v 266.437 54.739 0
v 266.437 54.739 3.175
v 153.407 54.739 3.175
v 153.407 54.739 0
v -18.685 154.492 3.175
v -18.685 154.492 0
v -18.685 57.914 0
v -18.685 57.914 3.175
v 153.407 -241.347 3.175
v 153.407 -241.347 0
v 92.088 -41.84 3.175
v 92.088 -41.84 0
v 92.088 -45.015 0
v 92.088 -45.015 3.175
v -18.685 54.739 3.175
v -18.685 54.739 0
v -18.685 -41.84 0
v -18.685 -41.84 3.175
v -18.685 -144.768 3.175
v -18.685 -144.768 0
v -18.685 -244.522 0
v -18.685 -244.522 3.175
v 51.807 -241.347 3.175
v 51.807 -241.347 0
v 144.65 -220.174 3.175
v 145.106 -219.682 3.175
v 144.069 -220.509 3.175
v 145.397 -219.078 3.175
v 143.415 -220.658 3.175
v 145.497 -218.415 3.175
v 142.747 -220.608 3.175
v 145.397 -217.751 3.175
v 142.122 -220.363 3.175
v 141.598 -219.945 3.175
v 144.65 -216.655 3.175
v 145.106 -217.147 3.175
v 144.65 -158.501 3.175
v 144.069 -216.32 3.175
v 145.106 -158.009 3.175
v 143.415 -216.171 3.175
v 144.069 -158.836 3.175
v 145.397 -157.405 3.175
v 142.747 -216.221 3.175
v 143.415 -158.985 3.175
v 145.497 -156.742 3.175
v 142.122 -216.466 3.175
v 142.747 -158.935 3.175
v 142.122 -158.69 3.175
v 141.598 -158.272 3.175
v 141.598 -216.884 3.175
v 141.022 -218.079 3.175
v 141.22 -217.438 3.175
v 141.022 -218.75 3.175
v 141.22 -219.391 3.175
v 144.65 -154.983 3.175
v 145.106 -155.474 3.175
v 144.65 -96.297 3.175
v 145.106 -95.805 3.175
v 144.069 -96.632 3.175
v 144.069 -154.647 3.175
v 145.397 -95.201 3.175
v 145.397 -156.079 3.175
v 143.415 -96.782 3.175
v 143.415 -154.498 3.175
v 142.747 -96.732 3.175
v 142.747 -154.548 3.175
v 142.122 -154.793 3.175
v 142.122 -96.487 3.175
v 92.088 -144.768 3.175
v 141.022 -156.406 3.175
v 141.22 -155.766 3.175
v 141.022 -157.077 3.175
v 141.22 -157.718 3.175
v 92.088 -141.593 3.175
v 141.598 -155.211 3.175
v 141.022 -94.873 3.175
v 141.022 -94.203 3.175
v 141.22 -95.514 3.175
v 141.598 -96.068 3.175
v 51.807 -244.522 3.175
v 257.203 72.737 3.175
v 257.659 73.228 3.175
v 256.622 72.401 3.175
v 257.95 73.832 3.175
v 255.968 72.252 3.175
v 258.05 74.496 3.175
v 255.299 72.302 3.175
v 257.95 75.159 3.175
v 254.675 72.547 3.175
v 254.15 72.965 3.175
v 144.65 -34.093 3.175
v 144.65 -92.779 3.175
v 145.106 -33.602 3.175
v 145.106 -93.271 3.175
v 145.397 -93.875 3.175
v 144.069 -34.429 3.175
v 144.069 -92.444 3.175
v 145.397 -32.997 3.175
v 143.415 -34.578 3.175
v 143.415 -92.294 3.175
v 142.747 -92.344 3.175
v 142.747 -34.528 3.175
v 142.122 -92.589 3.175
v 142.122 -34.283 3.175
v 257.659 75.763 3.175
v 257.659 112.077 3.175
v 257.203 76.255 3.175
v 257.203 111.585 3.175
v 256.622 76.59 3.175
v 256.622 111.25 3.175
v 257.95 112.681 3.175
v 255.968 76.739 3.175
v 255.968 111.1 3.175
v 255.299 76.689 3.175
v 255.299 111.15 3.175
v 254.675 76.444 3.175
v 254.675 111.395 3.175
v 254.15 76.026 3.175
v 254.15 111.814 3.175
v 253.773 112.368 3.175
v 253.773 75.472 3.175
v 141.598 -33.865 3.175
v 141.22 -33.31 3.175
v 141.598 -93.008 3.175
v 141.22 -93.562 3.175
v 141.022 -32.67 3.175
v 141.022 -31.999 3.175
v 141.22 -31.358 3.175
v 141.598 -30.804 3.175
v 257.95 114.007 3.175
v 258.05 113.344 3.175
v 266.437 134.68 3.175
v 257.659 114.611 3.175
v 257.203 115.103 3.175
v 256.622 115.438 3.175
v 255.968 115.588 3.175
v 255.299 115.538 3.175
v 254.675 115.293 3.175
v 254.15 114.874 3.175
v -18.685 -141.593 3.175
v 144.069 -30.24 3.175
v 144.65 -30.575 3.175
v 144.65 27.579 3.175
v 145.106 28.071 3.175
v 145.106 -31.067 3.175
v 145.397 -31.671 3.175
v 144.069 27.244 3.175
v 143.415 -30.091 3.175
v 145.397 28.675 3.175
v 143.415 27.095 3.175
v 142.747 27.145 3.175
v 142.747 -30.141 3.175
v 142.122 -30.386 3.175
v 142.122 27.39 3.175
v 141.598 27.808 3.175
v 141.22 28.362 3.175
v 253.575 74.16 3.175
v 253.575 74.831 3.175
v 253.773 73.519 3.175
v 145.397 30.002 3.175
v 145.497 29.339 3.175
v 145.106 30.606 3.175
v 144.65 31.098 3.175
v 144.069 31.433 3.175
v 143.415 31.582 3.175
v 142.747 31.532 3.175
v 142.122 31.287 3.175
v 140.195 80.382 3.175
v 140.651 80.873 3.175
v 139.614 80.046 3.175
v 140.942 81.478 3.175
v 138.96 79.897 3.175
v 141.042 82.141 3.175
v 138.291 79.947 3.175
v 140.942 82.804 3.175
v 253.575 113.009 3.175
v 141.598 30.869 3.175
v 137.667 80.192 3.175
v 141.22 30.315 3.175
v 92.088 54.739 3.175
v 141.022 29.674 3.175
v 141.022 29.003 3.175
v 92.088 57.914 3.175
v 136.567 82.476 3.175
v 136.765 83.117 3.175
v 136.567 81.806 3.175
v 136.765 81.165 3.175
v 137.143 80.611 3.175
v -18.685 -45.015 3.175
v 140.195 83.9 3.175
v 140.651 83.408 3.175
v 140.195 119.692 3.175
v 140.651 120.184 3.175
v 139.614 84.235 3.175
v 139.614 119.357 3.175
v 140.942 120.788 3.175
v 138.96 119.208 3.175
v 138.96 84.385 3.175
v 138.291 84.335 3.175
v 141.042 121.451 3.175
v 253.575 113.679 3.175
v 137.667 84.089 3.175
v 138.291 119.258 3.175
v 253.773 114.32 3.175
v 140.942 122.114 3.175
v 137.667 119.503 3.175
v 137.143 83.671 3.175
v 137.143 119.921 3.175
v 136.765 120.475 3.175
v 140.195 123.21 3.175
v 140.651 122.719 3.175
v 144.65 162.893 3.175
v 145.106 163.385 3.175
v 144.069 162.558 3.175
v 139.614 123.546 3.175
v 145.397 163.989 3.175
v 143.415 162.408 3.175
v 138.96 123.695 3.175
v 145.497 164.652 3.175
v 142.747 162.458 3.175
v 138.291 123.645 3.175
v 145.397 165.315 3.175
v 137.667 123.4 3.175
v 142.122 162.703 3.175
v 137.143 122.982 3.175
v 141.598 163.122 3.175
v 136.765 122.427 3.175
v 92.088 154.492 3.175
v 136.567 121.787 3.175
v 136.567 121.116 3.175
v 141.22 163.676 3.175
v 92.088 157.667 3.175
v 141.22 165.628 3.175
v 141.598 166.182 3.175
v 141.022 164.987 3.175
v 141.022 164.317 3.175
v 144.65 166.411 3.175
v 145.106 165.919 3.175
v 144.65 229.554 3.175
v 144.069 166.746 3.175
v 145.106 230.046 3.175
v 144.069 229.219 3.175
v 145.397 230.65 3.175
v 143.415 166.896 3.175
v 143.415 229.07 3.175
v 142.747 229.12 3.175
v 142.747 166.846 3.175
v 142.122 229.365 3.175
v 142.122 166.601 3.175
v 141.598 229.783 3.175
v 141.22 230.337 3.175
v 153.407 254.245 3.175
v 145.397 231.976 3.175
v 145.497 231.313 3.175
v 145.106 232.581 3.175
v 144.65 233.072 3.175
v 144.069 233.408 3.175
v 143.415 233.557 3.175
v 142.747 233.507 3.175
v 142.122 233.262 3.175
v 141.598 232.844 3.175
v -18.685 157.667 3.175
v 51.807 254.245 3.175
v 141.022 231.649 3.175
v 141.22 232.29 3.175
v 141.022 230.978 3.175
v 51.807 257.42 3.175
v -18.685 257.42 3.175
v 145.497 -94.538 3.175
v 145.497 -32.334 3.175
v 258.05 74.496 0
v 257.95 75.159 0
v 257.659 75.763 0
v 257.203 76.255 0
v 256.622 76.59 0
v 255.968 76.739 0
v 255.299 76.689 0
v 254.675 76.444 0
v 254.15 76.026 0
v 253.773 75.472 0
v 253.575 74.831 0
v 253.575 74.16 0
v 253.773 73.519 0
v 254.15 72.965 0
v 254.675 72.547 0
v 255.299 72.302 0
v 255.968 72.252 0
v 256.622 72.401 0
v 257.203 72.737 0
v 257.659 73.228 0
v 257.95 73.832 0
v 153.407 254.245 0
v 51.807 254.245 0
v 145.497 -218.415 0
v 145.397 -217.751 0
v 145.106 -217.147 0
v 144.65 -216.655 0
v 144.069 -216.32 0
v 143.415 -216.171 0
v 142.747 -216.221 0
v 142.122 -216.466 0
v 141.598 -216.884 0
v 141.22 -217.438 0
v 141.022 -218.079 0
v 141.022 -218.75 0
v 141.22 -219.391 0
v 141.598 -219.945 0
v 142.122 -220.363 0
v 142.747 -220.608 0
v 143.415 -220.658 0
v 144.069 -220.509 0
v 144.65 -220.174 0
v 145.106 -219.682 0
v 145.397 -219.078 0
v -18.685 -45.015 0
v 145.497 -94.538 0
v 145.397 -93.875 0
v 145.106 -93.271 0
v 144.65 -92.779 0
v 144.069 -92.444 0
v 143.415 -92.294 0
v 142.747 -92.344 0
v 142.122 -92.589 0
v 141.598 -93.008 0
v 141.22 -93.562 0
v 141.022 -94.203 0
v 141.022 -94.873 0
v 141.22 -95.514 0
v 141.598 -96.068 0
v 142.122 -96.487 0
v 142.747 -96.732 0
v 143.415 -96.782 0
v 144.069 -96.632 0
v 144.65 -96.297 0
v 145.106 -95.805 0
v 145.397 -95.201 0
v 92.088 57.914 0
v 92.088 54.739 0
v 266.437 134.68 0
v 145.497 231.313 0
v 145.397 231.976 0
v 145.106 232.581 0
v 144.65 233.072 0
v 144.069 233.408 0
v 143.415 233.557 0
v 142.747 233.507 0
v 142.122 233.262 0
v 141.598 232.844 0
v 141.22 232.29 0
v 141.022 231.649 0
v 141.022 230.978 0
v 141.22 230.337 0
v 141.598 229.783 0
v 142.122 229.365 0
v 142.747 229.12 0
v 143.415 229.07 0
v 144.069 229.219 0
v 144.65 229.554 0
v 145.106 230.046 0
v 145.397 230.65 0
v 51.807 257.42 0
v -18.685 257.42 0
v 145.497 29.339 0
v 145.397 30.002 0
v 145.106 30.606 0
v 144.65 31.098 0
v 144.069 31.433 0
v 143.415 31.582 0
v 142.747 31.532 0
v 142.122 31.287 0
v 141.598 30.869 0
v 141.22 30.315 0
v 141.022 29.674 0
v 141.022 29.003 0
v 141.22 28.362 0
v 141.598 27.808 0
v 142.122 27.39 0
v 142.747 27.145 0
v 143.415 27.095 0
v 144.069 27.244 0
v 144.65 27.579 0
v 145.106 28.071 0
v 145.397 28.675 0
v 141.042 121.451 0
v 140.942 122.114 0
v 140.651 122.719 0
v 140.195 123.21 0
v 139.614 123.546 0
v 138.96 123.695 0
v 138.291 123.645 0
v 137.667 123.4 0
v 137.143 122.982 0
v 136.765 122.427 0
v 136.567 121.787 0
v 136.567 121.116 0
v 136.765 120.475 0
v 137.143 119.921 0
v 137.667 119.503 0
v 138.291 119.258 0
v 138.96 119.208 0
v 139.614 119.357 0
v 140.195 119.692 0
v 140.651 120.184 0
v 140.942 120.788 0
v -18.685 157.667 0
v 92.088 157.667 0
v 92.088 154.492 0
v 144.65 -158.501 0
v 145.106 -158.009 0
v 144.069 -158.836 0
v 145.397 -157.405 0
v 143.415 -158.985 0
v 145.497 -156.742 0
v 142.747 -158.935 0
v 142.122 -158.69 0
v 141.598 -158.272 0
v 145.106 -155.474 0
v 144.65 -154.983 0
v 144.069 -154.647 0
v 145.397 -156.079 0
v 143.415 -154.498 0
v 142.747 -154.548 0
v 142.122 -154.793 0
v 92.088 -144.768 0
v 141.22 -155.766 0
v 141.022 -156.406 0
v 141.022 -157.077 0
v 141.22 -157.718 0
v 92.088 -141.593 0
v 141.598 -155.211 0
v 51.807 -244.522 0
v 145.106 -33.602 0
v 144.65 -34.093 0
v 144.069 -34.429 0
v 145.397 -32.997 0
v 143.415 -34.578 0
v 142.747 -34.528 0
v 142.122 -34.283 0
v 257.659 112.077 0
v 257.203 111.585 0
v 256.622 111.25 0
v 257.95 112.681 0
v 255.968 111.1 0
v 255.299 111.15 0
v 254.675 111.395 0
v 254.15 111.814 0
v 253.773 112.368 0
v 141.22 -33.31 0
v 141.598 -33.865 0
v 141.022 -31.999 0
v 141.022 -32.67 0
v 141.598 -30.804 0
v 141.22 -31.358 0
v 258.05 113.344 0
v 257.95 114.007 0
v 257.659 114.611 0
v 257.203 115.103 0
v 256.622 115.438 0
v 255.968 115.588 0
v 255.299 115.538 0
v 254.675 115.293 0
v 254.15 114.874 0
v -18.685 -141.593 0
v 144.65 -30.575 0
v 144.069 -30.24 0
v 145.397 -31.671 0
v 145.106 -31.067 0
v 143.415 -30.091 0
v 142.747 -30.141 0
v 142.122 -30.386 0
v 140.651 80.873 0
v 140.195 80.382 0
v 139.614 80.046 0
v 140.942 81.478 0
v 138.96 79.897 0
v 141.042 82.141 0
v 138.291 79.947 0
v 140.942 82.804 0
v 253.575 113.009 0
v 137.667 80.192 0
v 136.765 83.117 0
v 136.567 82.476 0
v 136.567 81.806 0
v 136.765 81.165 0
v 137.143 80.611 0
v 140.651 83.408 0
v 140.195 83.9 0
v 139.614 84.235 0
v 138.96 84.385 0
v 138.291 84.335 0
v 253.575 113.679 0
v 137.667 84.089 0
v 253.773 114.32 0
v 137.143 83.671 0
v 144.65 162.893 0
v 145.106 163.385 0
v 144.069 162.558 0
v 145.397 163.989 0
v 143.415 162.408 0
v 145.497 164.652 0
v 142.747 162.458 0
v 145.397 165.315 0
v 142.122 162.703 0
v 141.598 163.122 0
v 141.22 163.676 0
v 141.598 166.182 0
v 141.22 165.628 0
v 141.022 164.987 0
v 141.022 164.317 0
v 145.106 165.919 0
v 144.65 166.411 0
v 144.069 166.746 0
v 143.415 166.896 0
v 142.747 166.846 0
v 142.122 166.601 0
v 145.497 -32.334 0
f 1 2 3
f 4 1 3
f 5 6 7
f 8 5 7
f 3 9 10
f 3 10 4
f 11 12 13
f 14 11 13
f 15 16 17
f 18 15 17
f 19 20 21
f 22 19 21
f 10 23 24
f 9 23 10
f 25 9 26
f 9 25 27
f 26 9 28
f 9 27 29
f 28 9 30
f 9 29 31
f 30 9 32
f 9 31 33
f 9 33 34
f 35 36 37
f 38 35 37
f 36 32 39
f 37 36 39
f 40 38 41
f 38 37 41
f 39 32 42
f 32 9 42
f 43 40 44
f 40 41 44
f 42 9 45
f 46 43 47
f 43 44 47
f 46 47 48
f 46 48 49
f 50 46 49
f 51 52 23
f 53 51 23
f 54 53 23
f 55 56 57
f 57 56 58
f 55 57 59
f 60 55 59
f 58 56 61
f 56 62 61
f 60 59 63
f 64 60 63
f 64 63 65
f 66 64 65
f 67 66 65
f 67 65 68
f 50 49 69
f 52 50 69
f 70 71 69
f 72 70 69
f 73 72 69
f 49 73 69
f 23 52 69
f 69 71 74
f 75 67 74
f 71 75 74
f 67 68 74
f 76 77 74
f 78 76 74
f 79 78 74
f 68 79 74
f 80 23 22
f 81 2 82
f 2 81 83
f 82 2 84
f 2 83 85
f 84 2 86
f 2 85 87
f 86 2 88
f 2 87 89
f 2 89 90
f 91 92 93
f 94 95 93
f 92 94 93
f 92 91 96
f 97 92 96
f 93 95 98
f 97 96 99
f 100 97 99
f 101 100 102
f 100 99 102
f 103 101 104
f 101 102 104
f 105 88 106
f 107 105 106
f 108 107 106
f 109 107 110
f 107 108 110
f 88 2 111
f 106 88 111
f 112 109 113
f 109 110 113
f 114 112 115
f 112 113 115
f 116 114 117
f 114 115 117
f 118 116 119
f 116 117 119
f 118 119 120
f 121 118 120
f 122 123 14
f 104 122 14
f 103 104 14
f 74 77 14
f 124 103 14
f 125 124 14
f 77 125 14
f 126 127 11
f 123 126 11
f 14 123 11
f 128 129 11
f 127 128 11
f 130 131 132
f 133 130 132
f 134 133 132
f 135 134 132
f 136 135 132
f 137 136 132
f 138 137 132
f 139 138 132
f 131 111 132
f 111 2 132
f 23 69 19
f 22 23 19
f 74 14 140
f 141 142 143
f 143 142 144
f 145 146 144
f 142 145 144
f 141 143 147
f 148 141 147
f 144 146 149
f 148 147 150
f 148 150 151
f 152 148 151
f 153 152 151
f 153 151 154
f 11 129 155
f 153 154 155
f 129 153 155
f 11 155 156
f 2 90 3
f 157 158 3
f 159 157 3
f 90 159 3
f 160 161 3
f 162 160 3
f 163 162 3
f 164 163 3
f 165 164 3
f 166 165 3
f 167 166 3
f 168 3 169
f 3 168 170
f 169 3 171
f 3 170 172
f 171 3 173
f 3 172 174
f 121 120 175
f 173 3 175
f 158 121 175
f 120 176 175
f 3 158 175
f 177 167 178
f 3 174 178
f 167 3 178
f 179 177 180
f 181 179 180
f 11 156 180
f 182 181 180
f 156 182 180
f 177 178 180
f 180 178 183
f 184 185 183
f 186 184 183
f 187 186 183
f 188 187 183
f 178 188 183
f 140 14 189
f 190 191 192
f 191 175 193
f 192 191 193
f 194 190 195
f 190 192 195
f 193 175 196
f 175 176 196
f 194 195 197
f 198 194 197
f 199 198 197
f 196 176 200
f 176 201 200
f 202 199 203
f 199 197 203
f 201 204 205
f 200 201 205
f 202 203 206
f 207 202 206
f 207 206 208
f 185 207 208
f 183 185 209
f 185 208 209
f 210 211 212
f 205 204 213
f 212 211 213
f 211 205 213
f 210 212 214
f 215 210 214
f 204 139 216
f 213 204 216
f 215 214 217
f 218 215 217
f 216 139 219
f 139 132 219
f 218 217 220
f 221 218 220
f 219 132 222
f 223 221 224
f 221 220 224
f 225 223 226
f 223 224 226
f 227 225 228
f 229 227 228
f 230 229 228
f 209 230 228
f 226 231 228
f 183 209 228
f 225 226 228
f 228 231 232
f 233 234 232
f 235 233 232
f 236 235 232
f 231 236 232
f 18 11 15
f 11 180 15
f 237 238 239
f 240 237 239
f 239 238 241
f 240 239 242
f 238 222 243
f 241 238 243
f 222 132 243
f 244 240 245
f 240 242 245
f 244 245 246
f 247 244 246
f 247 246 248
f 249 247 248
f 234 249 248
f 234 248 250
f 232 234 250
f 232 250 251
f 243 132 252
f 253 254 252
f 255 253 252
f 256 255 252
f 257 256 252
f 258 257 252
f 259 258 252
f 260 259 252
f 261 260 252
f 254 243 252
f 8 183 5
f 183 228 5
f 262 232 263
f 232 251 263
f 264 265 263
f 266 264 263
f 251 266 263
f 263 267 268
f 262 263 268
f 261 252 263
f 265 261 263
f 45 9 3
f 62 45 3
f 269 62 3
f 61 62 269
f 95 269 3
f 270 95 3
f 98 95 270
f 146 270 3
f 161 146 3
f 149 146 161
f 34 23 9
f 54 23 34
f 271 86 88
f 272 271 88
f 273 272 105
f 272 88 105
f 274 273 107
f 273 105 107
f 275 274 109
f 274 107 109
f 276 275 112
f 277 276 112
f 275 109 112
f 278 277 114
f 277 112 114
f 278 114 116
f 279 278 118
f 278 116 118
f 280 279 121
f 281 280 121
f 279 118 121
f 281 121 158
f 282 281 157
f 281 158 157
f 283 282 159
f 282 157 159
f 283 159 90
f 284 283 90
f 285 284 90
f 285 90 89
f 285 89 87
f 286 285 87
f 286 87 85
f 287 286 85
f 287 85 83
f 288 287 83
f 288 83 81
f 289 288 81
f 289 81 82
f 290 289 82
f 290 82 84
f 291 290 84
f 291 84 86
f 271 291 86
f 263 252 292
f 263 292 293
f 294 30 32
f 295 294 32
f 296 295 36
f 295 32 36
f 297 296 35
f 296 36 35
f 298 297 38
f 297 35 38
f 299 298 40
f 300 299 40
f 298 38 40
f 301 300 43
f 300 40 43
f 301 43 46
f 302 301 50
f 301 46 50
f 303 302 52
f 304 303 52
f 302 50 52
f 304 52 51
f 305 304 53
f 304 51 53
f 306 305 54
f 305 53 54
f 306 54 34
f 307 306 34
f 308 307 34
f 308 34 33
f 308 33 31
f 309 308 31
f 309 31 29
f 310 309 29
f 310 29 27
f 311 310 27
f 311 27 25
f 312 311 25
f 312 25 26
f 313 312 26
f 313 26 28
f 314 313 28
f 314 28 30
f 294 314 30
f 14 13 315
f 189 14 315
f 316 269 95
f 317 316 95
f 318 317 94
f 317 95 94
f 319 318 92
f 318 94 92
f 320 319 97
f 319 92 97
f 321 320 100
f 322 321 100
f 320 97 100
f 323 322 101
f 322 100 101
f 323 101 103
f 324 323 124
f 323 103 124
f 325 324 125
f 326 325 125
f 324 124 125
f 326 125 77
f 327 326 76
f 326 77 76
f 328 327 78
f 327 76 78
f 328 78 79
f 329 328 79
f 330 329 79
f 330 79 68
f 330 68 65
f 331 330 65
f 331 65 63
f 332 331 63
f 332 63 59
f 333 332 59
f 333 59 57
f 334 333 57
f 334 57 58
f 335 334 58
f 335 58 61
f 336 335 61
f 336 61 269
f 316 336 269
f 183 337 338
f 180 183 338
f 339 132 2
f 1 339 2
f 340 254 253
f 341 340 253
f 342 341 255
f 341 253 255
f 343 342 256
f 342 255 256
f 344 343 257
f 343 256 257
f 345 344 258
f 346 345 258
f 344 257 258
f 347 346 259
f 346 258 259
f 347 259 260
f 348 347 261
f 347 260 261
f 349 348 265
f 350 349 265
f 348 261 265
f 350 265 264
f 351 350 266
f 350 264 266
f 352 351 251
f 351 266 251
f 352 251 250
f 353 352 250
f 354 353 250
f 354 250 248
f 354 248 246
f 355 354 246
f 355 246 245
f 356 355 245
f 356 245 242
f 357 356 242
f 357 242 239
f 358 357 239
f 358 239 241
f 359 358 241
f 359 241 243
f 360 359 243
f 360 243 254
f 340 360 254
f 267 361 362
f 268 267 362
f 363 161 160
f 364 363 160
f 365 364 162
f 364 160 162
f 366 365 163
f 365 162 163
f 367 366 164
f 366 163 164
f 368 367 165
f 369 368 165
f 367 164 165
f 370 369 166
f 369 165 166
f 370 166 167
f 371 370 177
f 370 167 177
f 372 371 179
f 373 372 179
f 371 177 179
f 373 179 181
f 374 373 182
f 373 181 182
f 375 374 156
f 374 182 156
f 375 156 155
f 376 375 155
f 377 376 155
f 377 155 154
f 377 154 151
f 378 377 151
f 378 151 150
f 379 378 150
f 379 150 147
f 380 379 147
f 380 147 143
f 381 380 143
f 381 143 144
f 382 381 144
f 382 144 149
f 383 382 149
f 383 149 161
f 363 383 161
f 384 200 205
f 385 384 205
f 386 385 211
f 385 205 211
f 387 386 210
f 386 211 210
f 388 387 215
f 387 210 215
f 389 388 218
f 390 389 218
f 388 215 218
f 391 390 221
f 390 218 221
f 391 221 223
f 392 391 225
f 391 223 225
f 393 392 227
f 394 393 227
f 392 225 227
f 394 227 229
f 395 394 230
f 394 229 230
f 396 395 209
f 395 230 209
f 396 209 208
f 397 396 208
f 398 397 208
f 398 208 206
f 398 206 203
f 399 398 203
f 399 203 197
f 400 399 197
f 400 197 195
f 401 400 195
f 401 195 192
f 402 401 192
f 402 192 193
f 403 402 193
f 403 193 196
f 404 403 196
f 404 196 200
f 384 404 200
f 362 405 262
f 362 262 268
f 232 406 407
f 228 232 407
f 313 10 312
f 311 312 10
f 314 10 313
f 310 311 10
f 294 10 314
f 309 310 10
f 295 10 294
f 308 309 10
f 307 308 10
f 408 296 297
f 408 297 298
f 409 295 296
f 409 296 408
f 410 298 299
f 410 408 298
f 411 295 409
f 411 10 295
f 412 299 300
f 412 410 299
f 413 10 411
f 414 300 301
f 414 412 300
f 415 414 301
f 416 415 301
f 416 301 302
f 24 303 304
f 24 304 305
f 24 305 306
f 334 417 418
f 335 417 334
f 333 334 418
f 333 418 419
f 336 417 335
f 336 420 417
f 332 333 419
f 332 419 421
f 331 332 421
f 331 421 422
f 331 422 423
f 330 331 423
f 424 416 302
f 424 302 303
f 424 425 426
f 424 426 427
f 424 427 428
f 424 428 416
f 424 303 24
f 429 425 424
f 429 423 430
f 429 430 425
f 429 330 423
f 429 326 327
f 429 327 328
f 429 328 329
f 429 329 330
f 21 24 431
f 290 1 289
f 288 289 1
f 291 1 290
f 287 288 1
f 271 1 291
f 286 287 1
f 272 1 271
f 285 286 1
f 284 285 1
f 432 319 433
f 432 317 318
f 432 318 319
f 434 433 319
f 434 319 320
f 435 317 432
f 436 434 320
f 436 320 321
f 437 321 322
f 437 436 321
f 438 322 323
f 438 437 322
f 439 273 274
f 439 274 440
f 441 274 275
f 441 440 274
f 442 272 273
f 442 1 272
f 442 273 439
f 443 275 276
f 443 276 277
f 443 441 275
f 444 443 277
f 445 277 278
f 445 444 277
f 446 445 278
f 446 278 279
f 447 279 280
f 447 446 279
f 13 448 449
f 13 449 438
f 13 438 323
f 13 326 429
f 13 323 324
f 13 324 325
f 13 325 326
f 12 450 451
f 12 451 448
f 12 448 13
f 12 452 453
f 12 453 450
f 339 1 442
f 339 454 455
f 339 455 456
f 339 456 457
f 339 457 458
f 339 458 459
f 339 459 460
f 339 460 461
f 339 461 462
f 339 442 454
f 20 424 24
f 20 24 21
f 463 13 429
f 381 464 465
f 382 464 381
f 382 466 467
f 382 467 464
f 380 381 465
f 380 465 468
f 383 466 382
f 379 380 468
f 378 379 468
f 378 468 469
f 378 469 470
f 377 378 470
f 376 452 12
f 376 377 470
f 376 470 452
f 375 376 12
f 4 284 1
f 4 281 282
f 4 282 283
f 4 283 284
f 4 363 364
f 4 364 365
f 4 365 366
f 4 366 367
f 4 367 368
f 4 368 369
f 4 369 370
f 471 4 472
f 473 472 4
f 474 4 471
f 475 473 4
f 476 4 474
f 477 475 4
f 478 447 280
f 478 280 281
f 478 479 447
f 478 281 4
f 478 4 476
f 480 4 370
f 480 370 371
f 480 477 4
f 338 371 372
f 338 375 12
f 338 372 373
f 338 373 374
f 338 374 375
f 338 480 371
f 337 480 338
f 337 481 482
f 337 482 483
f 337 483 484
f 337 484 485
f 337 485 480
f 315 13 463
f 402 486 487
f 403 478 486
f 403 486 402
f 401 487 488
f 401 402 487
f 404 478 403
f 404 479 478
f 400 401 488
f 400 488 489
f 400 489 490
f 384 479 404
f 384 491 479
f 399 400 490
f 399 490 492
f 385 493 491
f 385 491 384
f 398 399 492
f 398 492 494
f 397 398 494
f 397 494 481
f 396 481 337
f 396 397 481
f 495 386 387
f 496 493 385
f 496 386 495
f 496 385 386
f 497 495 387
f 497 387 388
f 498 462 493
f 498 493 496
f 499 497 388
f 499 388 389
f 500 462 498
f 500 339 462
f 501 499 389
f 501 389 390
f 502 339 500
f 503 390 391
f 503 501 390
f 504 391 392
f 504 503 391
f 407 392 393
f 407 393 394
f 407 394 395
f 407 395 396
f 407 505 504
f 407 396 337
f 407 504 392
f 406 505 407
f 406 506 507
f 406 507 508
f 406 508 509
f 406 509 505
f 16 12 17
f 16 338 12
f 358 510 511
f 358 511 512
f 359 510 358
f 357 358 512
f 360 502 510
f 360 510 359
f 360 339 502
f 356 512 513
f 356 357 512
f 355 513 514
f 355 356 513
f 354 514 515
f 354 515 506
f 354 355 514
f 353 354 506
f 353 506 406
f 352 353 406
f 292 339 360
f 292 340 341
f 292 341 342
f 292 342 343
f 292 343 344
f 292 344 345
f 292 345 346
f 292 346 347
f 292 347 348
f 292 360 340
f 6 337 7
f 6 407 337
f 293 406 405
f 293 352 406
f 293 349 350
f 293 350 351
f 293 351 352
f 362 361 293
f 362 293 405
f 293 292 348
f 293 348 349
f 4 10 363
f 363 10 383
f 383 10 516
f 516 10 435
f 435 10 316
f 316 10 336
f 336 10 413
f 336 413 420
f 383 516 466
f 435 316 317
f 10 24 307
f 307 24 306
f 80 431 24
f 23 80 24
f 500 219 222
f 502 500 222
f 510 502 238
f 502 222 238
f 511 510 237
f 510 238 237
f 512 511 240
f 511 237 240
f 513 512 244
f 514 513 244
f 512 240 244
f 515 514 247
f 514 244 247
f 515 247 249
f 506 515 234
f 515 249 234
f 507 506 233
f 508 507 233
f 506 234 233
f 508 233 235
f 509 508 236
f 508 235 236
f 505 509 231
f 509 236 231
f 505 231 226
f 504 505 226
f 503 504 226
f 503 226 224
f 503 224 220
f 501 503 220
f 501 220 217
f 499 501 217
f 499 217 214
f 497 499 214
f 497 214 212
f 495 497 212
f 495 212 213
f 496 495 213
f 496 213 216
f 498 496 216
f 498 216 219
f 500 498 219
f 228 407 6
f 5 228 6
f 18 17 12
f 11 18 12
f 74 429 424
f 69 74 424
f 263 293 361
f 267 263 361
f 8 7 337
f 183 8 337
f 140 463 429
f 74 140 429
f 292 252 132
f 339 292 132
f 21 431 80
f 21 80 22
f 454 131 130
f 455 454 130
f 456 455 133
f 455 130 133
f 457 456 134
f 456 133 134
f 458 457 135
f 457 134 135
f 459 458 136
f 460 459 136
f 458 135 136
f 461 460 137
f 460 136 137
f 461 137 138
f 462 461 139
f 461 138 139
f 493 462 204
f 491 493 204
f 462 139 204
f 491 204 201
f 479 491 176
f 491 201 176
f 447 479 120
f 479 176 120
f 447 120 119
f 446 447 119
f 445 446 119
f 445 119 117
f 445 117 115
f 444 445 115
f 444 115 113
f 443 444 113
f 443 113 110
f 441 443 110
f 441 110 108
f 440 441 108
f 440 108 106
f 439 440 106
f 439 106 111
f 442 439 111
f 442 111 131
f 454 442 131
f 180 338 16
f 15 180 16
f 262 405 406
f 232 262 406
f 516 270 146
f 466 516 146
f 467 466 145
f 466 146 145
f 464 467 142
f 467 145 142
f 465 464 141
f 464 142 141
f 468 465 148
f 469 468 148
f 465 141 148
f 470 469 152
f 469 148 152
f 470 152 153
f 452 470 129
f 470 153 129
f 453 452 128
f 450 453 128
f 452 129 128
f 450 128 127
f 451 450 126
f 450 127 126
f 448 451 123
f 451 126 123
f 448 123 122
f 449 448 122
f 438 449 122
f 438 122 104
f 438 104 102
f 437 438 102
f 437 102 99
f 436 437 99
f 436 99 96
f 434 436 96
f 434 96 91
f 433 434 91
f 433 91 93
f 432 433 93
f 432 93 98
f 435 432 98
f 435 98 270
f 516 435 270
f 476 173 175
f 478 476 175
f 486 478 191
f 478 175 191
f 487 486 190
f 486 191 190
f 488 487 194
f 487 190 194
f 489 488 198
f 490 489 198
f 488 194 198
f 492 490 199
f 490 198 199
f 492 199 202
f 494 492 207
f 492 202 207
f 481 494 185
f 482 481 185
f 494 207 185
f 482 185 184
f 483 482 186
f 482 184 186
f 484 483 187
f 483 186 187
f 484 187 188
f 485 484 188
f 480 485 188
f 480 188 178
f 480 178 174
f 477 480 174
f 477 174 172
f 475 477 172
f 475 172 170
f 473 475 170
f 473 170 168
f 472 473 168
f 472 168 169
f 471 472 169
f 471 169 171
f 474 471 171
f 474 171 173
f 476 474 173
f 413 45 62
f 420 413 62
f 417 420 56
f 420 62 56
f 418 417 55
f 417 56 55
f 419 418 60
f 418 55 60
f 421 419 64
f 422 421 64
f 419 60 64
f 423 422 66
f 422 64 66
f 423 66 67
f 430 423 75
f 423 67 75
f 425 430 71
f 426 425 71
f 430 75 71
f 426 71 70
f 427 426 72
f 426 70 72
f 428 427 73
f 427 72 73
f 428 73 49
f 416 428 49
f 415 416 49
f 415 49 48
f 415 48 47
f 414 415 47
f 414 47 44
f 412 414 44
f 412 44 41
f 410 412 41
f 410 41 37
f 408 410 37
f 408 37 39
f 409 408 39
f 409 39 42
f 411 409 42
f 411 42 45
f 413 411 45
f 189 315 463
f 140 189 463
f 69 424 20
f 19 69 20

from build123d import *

# Parameters (mm, degrees)
BOSS_EXTRUDE2_DEPTH = 3.175
BOSS_EXTRUDE3_DEPTH = 3.175
BOSS_EXTRUDE8_DEPTH = 3.175
SKETCH12_W          = 70.49262
SKETCH12_H          = 3.175
BOSS_EXTRUDE9_DEPTH = 3.175
SKETCH15_R          = 2.25
CUT_EXTRUDE1_DEPTH  = 371.49176257
SKETCH16_R          = 2.250000072
SKETCH16_R_2        = 2.25
CUT_EXTRUDE2_DEPTH  = 371.49176257


with BuildPart() as part:
    # Sketch1 → Boss-Extrude2 (new body)
    with BuildSketch(Plane.XY):
        Polygon((129.013076168, 254.245404572), (-18.685383832, 254.245404572), (-18.685383832, 157.666984572), (92.088461168, 157.666984572), (92.088461168, 154.491984572), (-18.685383832, 154.491984572), (-18.685383832, 57.913564572), (92.088461168, 57.913564572), (92.088461168, 54.738564572), (-18.685383832, 54.738564572), (-18.685383832, -41.839855428), (92.088461168, -41.839855428), (92.088461168, -45.014855428), (-18.685383832, -45.014855428), (-18.685383832, -141.593275428), (92.088461168, -141.593275428), (92.088461168, -144.768275428), (-18.685383832, -144.768275428), (-18.685383832, -241.346695428), (129.013076168, -241.346695428), align=None)
    extrude(amount=BOSS_EXTRUDE2_DEPTH)

    # Sketch4 → Boss-Extrude3 (add, through all)
    with BuildSketch(Plane.XY.offset(3.175)):
        Polygon((129.013076168, 254.245404572), (129.013076168, -241.346695428), (153.407236168, -241.346695428), (153.407236168, -227.262720585), (153.407236168, 240.16142973), (153.407236168, 254.245404572), align=None)
    extrude(amount=-BOSS_EXTRUDE3_DEPTH)

    # Sketch11 → Boss-Extrude8 (add, through all)
    with BuildSketch(Plane.XY.offset(3.175)):
        Polygon((266.437236168, 134.679984572), (266.437236168, 54.738564572), (153.407236168, 54.738564572), (153.407236168, 134.679984572), (153.407236168, 254.245404572), align=None)
    extrude(amount=-BOSS_EXTRUDE8_DEPTH)

    # Sketch12 → Boss-Extrude9 (add, through all)
    with BuildSketch(Plane(origin=(0, 0, 0), x_dir=(-1, 0, 0), z_dir=(0, 0, -1))):
        with Locations((-16.560926168, 255.832904572)):
            Rectangle(SKETCH12_W, SKETCH12_H)
        with Locations((-16.560926168, -242.934195428)):
            Rectangle(SKETCH12_W, SKETCH12_H)
    extrude(amount=-BOSS_EXTRUDE9_DEPTH)

    # Sketch15 → Cut-Extrude1 (cut, through all)
    with BuildSketch(Plane.XY.offset(3.175)):
        with Locations((143.247236168, 231.313297791)):
            Circle(SKETCH15_R)
        with Locations((143.247236168, 164.651984572)):
            Circle(SKETCH15_R)
        with Locations((255.799716168, 113.343984572)):
            Circle(SKETCH15_R)
        with Locations((255.799716168, 74.495671354)):
            Circle(SKETCH15_R)
        with Locations((143.247236168, 29.338564572)):
            Circle(SKETCH15_R)
        with Locations((143.247236168, -32.334232694)):
            Circle(SKETCH15_R)
        with Locations((143.247236168, -94.538012037)):
            Circle(SKETCH15_R)
        with Locations((143.247236168, -156.74179138)):
            Circle(SKETCH15_R)
        with Locations((143.247236168, -218.414588646)):
            Circle(SKETCH15_R)
    extrude(amount=-CUT_EXTRUDE1_DEPTH, mode=Mode.SUBTRACT)

    # Sketch16 → Cut-Extrude2 (cut, through all)
    with BuildSketch(Plane.XY.offset(3.175)):
        with Locations((138.792076168, 121.451235566)):
            Circle(SKETCH16_R)
        with Locations((138.792076168, 82.140925566)):
            Circle(SKETCH16_R_2)
    extrude(amount=-CUT_EXTRUDE2_DEPTH, mode=Mode.SUBTRACT)


solid = part.part
